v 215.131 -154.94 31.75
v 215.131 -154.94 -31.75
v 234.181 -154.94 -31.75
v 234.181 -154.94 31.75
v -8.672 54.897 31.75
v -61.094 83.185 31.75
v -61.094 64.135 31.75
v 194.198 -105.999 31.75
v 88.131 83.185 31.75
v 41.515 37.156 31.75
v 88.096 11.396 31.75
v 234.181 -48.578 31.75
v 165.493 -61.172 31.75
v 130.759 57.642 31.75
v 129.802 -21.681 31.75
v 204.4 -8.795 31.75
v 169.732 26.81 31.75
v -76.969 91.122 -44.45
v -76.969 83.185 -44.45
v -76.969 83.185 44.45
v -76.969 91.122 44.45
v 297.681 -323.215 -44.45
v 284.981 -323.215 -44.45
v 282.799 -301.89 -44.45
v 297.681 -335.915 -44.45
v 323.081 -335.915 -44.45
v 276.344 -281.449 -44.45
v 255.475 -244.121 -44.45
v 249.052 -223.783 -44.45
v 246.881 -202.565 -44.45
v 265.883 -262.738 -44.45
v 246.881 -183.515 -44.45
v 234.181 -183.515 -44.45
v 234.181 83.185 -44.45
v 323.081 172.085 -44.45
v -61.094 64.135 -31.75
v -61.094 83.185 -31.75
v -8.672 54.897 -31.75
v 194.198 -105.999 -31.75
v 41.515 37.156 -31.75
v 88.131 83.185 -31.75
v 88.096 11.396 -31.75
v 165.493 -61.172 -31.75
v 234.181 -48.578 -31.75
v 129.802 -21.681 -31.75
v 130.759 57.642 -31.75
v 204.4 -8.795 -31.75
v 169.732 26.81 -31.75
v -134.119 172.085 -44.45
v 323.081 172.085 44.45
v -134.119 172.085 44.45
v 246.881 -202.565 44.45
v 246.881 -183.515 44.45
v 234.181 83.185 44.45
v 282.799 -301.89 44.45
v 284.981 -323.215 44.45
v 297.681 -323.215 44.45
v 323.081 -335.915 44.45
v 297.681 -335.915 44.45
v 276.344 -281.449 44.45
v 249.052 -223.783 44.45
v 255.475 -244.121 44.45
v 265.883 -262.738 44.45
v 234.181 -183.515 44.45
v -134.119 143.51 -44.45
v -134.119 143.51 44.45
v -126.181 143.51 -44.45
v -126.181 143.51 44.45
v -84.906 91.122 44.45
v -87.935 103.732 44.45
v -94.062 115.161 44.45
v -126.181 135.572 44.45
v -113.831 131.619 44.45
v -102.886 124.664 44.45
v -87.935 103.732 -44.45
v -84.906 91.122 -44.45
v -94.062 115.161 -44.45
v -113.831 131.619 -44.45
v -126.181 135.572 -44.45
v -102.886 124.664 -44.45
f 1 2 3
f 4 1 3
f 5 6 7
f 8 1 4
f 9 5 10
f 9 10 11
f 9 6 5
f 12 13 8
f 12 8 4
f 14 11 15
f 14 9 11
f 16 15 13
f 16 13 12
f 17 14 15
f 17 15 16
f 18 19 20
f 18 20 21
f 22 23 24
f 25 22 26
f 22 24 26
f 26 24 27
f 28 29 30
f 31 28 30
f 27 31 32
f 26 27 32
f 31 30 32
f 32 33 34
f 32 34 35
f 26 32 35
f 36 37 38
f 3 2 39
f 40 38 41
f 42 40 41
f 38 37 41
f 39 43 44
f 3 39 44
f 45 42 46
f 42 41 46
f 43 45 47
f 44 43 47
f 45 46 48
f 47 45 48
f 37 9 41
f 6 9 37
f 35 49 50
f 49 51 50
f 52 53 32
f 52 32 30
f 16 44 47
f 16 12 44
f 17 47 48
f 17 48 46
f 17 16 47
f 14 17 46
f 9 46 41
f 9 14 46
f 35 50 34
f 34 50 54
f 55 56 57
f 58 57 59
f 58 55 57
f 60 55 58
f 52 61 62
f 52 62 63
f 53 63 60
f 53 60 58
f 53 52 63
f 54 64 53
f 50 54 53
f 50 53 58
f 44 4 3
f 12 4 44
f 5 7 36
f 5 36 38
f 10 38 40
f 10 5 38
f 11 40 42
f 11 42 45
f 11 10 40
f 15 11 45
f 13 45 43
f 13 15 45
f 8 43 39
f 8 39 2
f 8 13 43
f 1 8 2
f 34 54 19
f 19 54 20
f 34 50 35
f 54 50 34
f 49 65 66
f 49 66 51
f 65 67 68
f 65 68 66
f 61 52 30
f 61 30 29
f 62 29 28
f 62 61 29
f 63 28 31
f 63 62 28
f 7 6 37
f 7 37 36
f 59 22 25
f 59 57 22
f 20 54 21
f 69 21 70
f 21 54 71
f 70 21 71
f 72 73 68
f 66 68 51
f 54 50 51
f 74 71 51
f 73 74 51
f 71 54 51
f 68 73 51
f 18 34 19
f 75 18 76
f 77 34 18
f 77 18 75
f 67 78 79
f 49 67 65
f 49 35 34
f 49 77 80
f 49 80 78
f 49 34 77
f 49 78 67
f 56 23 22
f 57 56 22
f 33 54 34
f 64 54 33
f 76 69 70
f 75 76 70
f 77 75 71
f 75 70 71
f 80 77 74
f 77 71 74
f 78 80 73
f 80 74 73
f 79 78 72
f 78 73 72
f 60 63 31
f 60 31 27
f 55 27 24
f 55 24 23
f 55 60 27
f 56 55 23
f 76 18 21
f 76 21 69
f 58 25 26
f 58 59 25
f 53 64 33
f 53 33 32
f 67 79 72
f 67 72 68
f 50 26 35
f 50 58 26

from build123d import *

# Parameters (mm, degrees)
BOSS_EXTRUDE1_DEPTH = 44.45
BOSS_EXTRUDE2_DEPTH = 31.75
BOSS_EXTRUDE3_DEPTH = 44.45


with BuildPart() as part:
    # Sketch1 → Boss-Extrude1 (new body, symmetric)
    with BuildSketch(Plane.XY):
        with BuildLine():
            Line((-126.181276984, 135.5725), (-126.181276984, 143.51))
            Line((-126.181276984, 143.51), (-134.118776984, 143.51))
            Line((-134.118776984, 143.51), (-134.118776984, 172.085))
            Line((-134.118776984, 172.085), (323.081223016, 172.085))
            Line((323.081223016, 172.085), (234.181223016, 83.185))
            Line((234.181223016, 83.185), (-76.968776984, 83.185))
            Line((-76.968776984, 83.185), (-76.968776984, 91.1225))
            Line((-76.968776984, 91.1225), (-84.906276984, 91.1225))
            ThreePointArc((-84.906276984, 91.1225), (-98.169132336, 120.195384316), (-126.181276984, 135.5725))
        make_face()
    extrude(amount=BOSS_EXTRUDE1_DEPTH, both=True)


with BuildPart() as body_2:
    # Sketch1_3 → Boss-Extrude2 (new body, symmetric)
    with BuildSketch(Plane.XY):
        with BuildLine():
            ThreePointArc((234.181223016, -48.5775), (169.73213851, 26.809584042), (88.131223016, 83.185))
            Line((88.131223016, 83.185), (-61.093776984, 83.185))
            Line((-61.093776984, 83.185), (-61.093776984, 64.135))
            ThreePointArc((-61.093776984, 64.135), (109.632978176, -4.280178276), (215.131223016, -154.94))
            Line((215.131223016, -154.94), (234.181223016, -154.94))
            Line((234.181223016, -154.94), (234.181223016, -48.5775))
        make_face()
    extrude(amount=BOSS_EXTRUDE2_DEPTH, both=True)


with BuildPart() as body_3:
    # Sketch1_4 → Boss-Extrude3 (new body, symmetric)
    with BuildSketch(Plane.XY):
        with BuildLine():
            Line((323.081223016, -335.915), (323.081223016, 172.085))
            Line((323.081223016, 172.085), (234.181223016, 83.185))
            Line((234.181223016, 83.185), (234.181223016, -183.515))
            Line((234.181223016, -183.515), (246.881223016, -183.515))
            Line((246.881223016, -183.515), (246.881223016, -202.565))
            ThreePointArc((246.881223016, -202.565), (251.744599276, -234.116039076), (265.883238129, -262.738047859))
            ThreePointArc((265.883238129, -262.738047859), (280.093284249, -291.504612242), (284.981223016, -323.215))
            Line((284.981223016, -323.215), (297.681223016, -323.215))
            Line((297.681223016, -323.215), (297.681223016, -335.915))
            Line((297.681223016, -335.915), (323.081223016, -335.915))
        make_face()
    extrude(amount=BOSS_EXTRUDE3_DEPTH, both=True)


solid = Compound([part.part, body_2.part, body_3.part])
